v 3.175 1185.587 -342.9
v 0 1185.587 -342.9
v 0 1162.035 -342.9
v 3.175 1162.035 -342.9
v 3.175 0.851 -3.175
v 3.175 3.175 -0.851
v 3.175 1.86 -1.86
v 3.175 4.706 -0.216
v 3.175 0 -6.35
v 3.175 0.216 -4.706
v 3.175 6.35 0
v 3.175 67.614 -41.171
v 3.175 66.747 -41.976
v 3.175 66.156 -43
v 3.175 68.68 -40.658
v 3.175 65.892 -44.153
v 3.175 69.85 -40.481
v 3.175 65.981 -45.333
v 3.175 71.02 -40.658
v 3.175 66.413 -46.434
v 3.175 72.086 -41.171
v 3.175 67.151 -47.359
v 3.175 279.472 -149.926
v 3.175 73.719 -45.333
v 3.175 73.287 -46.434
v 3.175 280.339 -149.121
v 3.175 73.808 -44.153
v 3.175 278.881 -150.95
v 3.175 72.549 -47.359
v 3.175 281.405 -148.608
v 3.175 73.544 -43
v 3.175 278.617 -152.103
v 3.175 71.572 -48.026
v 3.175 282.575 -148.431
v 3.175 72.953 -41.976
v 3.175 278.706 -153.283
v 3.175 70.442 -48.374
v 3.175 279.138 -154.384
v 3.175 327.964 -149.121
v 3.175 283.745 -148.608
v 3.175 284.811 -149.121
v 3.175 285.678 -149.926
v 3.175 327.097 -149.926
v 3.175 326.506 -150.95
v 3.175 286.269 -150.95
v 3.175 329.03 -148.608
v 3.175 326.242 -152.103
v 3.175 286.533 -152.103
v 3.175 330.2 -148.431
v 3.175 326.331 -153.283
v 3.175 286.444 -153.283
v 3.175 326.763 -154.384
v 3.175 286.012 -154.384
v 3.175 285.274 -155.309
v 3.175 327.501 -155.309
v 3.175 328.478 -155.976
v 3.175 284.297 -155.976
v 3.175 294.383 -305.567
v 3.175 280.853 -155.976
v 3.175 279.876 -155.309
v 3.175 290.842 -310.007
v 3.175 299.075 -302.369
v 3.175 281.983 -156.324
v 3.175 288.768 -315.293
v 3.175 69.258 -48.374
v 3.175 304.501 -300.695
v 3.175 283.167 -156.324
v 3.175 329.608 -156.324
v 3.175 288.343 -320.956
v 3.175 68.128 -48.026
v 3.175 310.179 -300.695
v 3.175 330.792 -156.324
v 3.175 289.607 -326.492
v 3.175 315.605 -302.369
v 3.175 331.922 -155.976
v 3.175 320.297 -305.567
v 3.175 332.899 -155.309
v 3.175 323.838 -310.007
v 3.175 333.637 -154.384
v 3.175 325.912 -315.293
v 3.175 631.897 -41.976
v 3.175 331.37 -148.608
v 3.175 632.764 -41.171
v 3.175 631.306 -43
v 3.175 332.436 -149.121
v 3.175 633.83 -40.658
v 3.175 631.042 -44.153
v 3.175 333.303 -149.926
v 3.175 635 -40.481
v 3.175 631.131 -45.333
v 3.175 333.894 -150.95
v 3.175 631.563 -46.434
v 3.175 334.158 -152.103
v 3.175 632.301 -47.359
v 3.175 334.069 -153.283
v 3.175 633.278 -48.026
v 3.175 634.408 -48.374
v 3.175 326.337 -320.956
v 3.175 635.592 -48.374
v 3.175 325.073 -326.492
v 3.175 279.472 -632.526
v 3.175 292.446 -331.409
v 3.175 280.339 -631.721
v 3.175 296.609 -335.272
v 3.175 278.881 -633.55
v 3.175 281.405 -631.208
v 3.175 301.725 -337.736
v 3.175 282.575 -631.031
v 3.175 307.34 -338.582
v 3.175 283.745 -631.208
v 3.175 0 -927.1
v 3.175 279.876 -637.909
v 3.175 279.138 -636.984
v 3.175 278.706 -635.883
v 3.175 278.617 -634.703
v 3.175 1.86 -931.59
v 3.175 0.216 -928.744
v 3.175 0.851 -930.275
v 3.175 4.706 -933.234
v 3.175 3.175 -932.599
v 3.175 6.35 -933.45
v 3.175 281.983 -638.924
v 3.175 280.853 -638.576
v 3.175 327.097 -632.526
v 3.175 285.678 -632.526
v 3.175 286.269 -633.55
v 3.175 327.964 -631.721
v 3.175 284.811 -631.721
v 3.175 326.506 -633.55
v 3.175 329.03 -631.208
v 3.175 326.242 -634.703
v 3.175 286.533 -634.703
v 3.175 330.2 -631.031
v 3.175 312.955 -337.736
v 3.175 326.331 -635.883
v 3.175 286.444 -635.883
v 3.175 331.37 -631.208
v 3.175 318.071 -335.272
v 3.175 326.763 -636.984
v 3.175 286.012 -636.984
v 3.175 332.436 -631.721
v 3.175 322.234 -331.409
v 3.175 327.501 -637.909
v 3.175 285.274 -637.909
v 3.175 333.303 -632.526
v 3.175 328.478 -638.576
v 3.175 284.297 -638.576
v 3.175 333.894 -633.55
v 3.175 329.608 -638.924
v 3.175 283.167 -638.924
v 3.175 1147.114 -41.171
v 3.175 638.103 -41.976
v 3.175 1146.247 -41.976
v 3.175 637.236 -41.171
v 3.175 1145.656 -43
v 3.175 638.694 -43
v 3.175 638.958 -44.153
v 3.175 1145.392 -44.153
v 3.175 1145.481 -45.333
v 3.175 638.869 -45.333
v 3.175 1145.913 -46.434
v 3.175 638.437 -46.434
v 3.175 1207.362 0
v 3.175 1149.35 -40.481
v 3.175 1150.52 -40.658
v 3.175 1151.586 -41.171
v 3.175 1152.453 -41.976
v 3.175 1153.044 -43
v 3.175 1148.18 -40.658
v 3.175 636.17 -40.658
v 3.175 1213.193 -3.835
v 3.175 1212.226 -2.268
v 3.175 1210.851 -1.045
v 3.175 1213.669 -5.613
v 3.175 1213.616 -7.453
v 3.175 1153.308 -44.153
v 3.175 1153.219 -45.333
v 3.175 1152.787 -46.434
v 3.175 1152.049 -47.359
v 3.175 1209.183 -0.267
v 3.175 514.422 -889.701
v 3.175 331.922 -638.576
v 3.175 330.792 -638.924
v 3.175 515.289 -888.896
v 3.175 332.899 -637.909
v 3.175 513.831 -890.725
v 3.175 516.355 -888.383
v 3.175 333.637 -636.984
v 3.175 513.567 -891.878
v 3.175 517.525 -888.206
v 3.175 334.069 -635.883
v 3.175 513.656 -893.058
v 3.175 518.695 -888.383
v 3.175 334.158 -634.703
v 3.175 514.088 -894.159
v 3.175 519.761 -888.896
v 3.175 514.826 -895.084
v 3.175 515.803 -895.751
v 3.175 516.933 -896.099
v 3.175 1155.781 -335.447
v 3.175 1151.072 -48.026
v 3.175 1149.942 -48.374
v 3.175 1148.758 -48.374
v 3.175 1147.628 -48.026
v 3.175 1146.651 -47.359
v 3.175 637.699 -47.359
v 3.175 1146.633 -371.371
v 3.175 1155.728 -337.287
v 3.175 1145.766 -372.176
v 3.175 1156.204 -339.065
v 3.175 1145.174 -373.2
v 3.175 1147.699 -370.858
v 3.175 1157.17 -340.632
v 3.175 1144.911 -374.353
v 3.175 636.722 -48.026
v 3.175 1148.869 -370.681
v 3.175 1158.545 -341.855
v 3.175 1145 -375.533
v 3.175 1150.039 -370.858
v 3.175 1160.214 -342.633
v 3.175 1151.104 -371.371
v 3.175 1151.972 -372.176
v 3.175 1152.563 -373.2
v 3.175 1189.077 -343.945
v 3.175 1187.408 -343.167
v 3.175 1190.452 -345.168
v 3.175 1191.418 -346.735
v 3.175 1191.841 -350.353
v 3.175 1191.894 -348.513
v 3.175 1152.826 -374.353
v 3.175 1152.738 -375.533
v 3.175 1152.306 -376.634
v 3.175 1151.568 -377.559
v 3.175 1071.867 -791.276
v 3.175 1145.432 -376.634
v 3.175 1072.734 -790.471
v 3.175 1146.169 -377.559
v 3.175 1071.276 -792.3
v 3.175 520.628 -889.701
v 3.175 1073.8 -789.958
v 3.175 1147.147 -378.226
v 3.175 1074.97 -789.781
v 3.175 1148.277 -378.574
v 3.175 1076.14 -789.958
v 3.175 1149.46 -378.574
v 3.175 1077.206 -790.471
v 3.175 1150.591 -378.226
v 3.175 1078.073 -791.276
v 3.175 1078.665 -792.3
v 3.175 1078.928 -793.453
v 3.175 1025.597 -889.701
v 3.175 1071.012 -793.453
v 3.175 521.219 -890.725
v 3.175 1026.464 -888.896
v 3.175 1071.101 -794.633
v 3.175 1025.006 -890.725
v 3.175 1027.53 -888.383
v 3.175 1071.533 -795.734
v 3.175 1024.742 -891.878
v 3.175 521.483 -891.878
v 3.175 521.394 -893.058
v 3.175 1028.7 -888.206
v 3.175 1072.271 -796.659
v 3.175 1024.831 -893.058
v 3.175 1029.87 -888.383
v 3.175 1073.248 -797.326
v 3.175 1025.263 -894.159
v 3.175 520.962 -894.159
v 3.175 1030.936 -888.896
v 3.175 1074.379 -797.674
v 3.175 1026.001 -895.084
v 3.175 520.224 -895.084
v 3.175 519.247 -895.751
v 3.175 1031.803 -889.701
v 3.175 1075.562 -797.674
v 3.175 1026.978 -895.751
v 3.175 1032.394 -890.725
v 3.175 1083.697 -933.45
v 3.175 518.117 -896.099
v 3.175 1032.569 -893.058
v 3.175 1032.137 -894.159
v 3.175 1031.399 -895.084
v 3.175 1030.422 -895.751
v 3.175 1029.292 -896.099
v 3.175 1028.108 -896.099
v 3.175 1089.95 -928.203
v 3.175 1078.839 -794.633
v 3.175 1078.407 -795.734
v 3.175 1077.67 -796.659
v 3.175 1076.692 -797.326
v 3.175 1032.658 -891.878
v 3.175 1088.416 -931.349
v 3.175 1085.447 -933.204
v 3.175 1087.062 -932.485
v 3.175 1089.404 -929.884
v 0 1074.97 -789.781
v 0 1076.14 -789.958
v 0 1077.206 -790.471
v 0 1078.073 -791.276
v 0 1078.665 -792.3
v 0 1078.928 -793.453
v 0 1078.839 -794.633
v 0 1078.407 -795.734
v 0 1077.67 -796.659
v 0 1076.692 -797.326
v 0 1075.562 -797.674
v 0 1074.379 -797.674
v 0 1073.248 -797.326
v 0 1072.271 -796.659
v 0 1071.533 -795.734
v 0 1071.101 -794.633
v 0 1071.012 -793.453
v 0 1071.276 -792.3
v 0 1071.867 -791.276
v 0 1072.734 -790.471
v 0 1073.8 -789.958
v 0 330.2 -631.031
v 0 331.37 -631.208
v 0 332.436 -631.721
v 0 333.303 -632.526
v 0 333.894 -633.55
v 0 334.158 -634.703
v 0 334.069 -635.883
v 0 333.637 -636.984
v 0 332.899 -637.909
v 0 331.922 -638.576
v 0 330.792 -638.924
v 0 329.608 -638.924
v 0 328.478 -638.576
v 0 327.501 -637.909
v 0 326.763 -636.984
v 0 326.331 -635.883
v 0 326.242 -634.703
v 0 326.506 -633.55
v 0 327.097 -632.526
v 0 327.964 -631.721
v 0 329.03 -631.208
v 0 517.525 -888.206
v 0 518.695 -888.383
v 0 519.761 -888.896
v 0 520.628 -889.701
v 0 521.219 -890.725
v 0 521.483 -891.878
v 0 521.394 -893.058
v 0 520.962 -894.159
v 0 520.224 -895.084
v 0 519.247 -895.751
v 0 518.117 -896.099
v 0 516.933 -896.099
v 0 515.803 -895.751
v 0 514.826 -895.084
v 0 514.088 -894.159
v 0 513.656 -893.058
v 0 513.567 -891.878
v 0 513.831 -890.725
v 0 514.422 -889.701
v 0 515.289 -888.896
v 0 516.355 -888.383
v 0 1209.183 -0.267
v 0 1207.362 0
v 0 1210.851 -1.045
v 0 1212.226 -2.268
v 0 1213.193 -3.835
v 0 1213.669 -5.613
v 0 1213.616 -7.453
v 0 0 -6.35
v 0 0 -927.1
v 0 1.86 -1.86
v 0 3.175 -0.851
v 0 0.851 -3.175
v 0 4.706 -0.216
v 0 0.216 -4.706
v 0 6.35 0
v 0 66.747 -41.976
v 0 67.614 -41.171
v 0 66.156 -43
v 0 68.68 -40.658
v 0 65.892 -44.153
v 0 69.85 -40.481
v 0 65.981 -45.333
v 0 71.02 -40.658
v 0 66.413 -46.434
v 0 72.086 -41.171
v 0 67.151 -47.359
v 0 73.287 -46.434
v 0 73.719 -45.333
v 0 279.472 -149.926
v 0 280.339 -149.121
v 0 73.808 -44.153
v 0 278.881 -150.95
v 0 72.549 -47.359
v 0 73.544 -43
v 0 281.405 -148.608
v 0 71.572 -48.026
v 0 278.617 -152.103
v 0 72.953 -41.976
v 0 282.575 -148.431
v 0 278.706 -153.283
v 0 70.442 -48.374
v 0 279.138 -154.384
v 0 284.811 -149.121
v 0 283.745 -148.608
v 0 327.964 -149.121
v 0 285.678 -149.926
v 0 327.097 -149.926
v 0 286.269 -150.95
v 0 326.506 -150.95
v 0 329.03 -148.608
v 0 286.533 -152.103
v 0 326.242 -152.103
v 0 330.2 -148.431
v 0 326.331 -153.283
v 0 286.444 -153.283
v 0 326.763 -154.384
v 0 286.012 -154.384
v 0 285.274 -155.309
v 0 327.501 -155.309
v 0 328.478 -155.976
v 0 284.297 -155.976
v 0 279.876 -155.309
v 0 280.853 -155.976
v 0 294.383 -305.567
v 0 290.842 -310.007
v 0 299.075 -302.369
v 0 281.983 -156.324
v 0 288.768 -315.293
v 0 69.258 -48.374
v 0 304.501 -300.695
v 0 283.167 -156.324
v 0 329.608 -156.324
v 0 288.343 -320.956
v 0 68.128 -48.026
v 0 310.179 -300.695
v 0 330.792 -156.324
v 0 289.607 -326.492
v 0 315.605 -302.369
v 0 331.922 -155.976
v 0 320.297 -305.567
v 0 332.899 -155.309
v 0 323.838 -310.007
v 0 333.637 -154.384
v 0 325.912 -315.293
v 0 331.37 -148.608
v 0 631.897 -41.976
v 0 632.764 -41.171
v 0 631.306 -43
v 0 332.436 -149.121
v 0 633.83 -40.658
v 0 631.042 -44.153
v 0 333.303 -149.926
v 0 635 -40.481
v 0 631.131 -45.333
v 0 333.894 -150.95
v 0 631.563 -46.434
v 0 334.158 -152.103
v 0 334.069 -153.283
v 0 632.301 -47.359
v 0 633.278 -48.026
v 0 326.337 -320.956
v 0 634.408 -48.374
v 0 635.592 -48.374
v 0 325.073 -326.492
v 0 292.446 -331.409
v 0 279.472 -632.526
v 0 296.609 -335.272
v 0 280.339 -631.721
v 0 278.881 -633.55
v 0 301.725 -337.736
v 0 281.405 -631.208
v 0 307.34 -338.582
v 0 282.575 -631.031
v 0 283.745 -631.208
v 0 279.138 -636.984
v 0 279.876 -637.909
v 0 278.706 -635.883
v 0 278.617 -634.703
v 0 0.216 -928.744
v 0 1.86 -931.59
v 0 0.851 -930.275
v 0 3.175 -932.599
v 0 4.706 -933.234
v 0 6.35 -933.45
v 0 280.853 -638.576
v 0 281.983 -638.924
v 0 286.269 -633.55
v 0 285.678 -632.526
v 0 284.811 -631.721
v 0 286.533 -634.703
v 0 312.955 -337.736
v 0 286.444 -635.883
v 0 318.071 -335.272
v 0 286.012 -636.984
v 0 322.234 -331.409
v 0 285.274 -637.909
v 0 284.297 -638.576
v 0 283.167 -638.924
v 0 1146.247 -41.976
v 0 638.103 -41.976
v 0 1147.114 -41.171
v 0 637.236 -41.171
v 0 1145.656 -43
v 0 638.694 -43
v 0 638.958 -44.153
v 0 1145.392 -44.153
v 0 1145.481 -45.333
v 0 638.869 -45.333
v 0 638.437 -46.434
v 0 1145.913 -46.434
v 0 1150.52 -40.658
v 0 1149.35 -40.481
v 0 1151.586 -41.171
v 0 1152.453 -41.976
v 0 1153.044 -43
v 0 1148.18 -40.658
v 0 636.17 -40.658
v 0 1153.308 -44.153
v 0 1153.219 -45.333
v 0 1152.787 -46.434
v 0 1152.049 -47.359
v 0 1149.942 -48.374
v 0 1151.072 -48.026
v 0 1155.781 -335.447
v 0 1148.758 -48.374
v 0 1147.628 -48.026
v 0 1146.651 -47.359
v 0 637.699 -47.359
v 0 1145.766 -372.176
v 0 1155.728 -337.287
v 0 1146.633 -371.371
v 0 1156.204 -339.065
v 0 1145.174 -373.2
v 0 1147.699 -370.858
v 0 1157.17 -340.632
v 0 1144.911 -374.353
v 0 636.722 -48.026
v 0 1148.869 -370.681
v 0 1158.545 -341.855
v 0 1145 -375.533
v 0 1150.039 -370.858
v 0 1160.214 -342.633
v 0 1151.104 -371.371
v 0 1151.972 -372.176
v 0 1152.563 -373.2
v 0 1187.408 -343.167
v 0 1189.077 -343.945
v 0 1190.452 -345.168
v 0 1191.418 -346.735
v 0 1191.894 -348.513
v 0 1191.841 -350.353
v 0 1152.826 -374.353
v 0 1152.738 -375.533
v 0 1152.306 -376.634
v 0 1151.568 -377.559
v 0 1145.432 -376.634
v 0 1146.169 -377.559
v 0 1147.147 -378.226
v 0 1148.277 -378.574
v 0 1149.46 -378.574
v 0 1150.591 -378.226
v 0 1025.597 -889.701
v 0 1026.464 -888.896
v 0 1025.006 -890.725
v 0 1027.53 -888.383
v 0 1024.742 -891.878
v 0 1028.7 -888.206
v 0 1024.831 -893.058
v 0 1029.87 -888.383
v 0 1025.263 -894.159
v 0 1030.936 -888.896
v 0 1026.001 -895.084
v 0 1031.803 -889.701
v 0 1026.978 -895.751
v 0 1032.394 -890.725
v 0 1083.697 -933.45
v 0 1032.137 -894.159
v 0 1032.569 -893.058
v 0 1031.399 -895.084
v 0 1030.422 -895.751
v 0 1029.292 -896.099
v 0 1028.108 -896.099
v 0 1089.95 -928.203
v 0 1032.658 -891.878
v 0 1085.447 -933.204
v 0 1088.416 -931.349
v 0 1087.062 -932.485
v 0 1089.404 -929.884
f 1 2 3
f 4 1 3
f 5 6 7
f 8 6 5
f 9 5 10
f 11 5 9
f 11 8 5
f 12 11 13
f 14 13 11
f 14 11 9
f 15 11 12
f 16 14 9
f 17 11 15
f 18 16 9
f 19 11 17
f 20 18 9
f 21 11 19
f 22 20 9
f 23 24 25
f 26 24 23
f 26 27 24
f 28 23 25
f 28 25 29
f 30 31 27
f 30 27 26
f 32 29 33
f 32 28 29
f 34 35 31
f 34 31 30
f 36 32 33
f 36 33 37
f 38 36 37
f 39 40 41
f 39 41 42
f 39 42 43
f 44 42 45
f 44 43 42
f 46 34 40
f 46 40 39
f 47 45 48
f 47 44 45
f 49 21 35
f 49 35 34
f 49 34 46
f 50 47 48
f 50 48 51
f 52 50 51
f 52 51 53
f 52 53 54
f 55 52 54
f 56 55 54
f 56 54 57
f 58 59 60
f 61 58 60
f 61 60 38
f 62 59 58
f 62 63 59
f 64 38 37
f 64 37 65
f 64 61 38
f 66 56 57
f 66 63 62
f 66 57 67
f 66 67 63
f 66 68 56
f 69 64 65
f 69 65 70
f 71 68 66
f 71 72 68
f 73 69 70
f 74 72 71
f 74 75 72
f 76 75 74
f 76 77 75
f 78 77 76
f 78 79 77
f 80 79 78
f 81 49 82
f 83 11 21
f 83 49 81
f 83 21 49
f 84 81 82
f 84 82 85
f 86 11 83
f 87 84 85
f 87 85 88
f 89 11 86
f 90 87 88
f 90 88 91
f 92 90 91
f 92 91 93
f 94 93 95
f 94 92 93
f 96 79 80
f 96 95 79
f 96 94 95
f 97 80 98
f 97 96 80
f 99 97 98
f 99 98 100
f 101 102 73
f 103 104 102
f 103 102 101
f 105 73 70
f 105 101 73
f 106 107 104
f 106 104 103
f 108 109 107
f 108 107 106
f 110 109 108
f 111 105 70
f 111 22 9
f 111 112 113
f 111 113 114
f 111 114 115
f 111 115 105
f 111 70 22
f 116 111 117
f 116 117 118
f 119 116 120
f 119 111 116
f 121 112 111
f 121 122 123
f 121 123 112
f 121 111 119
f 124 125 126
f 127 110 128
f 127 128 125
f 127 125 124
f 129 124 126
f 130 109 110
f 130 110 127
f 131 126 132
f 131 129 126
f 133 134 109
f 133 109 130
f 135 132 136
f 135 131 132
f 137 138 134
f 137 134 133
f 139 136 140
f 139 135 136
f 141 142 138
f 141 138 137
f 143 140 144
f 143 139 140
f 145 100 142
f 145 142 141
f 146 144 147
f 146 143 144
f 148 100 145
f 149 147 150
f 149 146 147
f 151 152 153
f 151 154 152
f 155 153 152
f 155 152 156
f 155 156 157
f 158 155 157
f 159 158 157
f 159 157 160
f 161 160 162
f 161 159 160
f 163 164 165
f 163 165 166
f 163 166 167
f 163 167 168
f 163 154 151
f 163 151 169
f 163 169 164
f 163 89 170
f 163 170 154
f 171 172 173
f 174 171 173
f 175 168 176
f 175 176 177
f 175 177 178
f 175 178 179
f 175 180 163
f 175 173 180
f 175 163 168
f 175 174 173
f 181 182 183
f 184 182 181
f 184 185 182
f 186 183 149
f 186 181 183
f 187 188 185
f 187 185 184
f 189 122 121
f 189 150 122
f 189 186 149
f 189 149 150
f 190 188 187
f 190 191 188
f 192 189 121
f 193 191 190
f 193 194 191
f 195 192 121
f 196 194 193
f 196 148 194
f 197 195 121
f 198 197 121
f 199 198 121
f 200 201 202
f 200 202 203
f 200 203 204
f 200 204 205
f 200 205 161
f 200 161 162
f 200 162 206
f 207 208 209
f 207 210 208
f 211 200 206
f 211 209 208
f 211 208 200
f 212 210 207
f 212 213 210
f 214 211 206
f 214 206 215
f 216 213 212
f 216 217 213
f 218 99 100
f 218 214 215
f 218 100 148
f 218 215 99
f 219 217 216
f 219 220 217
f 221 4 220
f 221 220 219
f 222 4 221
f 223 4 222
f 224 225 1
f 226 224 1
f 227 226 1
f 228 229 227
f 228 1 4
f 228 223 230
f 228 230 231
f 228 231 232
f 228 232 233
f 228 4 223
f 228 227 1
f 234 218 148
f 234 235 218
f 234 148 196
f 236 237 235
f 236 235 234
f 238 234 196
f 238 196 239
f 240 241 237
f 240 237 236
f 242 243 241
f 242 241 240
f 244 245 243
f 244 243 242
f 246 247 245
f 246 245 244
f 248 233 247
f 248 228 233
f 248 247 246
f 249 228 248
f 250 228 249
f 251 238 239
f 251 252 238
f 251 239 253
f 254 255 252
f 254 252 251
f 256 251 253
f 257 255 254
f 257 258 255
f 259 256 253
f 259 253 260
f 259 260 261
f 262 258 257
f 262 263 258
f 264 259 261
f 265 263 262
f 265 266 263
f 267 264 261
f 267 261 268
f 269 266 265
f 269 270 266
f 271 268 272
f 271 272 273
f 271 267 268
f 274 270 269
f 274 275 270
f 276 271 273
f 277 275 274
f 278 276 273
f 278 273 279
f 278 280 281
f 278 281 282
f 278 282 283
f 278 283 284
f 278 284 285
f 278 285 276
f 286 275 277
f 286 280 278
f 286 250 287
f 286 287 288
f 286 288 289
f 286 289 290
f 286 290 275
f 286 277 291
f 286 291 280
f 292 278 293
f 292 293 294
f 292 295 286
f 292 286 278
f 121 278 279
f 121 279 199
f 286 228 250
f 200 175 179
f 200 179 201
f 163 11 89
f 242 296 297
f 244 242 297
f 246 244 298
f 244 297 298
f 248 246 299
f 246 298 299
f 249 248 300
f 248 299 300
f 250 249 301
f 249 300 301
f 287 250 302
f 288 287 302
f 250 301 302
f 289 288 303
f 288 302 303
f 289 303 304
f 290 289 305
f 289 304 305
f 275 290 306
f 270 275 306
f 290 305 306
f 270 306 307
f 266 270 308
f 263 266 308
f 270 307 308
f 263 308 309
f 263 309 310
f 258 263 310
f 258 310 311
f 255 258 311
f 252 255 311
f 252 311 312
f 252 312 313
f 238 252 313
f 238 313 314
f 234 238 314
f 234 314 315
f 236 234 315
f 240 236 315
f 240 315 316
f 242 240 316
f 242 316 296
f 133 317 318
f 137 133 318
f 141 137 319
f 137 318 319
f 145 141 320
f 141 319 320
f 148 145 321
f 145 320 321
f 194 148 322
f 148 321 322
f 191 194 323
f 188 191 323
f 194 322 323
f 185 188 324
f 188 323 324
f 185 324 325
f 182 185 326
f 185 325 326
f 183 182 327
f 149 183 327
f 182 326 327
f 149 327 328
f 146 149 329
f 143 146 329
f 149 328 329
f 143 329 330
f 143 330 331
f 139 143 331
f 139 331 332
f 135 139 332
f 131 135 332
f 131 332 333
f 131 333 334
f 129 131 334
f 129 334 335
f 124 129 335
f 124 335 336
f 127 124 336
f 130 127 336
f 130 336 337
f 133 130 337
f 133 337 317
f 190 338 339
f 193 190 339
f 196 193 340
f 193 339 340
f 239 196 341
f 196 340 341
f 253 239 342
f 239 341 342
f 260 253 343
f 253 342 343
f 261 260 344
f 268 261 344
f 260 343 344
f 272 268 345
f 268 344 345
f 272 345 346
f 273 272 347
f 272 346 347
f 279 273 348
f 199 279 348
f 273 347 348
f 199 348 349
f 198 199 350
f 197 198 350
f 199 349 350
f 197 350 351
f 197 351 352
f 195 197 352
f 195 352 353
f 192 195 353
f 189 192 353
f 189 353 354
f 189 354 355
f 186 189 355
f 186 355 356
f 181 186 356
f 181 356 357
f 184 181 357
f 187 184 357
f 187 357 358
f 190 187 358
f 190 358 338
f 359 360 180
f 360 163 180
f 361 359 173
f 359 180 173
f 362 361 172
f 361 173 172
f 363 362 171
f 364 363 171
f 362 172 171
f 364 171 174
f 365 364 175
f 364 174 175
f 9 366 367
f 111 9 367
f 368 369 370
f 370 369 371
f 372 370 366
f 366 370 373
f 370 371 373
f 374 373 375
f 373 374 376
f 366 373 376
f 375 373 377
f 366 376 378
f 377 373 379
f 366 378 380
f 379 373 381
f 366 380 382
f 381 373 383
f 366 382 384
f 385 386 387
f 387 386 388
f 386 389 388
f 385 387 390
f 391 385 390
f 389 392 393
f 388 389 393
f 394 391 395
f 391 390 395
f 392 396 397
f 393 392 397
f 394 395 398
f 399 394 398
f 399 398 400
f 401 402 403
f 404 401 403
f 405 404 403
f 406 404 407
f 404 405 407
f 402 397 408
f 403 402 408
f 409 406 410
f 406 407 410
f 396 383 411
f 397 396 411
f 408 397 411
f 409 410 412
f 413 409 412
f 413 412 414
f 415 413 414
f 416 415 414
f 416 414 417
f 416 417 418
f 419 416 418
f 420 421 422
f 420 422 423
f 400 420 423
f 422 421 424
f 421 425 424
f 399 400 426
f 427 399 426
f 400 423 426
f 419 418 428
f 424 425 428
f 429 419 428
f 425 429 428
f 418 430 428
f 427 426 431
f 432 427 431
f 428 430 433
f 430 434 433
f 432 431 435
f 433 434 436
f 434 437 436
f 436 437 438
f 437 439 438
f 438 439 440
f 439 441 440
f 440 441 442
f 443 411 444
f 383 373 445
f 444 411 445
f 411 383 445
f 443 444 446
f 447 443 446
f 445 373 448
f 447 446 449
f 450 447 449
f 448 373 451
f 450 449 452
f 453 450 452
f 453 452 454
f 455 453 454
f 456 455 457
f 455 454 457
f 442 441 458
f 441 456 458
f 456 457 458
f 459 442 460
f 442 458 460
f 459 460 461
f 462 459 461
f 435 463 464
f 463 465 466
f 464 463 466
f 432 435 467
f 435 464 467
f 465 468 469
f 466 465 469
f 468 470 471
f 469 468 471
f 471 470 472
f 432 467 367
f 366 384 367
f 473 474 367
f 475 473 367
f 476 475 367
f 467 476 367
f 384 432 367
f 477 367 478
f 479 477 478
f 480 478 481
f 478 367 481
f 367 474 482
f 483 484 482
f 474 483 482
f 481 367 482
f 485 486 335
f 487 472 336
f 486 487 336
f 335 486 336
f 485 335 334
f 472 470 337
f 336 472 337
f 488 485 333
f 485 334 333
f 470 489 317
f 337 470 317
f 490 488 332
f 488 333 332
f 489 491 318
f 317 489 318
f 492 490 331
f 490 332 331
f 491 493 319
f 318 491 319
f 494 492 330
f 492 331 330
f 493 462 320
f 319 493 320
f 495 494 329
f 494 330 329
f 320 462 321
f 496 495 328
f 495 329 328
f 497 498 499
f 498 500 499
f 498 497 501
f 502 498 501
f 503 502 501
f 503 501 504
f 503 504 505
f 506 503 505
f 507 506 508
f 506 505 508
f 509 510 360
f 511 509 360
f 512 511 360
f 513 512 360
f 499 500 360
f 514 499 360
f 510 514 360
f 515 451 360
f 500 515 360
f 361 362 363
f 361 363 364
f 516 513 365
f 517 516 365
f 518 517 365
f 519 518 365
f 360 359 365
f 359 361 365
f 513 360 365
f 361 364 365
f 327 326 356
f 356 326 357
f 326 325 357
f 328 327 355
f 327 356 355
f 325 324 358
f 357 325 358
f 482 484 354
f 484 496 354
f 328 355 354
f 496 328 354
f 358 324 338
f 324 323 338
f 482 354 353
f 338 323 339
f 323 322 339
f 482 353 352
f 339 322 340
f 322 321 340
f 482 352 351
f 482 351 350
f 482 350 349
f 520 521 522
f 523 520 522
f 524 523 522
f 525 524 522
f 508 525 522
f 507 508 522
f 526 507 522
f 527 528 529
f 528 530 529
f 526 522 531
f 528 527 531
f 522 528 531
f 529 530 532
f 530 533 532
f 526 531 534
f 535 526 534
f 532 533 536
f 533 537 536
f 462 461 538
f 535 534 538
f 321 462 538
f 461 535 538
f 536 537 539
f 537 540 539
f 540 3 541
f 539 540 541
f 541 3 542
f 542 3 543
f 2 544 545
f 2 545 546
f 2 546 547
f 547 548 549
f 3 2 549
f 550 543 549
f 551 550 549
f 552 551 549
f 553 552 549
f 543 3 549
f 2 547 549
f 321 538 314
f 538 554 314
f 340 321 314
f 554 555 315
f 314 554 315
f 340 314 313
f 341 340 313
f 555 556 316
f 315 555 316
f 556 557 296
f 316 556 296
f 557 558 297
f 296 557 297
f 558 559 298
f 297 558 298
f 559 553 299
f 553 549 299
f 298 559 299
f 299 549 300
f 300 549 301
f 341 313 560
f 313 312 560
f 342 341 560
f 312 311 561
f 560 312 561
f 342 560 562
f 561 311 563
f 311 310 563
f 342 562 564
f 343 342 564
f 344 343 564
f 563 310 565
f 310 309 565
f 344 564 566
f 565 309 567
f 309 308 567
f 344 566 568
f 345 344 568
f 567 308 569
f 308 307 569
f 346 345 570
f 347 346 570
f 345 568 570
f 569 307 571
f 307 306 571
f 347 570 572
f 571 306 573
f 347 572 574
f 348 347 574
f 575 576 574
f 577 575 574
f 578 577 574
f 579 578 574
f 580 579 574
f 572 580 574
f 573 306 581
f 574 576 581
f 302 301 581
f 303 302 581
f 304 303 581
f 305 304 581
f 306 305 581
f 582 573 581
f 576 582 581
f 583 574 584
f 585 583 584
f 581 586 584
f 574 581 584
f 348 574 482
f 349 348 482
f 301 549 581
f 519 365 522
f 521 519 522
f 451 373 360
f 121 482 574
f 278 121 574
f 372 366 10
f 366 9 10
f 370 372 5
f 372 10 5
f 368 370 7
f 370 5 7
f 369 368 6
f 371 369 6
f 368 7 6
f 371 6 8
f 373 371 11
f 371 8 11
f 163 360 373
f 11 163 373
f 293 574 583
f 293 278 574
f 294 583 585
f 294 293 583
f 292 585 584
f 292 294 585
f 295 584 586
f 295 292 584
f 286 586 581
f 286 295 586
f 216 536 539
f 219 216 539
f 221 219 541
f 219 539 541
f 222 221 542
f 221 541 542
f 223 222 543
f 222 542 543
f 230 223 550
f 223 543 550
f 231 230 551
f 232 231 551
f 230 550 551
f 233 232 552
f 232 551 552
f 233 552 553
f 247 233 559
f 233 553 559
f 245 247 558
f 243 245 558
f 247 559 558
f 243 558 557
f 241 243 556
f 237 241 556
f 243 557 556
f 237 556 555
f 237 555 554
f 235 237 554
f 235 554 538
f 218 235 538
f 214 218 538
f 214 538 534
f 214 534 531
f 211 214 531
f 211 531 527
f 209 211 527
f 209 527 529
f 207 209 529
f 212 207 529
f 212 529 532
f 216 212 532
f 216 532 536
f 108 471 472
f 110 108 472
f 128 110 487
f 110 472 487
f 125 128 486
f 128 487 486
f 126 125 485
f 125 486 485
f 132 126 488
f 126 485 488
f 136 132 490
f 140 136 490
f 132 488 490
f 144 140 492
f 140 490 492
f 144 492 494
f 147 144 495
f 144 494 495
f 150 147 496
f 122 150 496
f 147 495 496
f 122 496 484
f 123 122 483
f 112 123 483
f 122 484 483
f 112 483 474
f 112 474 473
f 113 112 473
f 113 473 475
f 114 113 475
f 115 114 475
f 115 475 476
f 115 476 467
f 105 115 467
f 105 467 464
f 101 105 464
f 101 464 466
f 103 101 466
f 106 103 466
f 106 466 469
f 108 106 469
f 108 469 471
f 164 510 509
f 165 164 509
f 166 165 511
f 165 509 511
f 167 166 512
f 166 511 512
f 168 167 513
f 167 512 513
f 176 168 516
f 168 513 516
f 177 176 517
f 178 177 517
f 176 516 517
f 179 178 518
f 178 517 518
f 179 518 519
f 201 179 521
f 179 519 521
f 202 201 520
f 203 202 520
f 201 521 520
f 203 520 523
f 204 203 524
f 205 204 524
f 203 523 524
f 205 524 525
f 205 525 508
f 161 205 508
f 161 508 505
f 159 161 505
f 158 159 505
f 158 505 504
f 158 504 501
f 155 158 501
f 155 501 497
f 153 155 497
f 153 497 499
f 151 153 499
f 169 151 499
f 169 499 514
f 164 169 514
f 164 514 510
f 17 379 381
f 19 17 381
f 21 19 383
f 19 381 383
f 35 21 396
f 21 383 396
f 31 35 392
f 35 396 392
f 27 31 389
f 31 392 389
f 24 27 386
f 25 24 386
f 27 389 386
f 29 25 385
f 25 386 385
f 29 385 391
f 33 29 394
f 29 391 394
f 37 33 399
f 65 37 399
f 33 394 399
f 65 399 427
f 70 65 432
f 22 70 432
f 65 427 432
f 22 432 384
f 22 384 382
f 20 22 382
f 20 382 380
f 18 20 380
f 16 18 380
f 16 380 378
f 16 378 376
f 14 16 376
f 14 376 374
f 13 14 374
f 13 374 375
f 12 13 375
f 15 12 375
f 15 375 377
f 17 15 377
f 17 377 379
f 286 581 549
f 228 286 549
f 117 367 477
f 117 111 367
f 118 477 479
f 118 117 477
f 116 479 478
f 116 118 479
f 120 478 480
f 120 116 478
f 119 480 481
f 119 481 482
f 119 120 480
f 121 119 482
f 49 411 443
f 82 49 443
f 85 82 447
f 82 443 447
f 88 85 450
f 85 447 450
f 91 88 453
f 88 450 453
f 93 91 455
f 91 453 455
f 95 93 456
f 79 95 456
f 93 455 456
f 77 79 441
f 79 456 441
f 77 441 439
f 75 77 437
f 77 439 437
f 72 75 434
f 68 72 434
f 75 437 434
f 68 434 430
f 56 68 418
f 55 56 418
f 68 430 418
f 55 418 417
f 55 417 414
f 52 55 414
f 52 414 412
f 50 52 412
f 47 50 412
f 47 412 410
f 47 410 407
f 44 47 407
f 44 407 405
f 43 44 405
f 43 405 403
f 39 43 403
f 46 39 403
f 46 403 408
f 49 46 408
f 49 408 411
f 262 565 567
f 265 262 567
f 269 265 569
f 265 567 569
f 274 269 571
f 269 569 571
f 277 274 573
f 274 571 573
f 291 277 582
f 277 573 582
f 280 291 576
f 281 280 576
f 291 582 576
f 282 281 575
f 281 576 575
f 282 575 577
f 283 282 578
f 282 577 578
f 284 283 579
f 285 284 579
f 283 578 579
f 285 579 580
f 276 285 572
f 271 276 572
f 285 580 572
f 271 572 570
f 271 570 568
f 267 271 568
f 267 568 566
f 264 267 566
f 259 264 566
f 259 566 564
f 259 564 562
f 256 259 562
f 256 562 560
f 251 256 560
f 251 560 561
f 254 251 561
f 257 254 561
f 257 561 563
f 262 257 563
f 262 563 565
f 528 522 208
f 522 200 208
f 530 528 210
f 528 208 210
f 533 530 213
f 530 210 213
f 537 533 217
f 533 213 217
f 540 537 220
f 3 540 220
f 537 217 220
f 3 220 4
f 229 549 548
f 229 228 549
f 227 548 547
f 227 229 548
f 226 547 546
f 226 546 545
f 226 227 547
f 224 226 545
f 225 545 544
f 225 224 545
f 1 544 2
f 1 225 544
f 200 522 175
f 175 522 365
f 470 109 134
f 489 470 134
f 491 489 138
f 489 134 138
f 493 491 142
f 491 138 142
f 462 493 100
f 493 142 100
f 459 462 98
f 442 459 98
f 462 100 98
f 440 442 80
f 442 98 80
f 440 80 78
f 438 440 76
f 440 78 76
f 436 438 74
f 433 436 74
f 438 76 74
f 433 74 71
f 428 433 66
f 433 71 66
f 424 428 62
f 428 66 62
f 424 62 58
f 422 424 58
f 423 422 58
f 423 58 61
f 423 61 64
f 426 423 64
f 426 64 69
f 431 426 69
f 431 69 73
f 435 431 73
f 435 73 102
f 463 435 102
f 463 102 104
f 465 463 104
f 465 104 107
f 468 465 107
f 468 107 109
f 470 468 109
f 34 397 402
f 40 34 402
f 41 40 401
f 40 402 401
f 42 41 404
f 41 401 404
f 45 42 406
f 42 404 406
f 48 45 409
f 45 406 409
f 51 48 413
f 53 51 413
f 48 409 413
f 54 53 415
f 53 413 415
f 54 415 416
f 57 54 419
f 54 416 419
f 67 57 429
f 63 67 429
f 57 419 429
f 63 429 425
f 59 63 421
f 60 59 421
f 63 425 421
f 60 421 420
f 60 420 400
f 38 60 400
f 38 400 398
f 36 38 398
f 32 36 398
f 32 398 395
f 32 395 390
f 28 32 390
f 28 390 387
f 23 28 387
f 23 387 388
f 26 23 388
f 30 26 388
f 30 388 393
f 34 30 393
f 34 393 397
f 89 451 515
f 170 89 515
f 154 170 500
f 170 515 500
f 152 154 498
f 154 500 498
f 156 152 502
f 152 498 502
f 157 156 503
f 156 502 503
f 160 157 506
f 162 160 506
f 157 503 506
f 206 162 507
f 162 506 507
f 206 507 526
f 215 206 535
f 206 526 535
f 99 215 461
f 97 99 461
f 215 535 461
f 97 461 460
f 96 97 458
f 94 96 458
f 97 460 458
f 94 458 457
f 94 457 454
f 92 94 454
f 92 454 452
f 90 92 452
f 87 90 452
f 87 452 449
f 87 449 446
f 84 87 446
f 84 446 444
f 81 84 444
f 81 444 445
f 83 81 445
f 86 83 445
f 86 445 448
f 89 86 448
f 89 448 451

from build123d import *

# Parameters (mm, degrees)
BOSS_EXTRUDE1_DEPTH            = 3.175
SKETCH2_R                      = 19.05
CUT_EXTRUDE1_DEPTH             = 4.175
FILLET1_R                      = 6.35
F_5_16_0_3125_DIAMETER_HOLE1_D = 7.9375


with BuildPart() as part:
    # Sketch1 → Boss-Extrude1 (new body)
    with BuildSketch(Plane(origin=(0, 0, 0), x_dir=(0, 0, -1), z_dir=(1, 0, 0))):
        Polygon((0, 0), (933.45, 0), (933.45, 1089.025), (342.9, 1193.154898457), (342.9, 1154.467144545), (0, 1214.929666229), align=None)
    extrude(amount=BOSS_EXTRUDE1_DEPTH)

    # Sketch2 → Cut-Extrude1 (cut, through all)
    with BuildSketch(Plane(origin=(3.175, 0, 0), x_dir=(0, 0, -1), z_dir=(1, 0, 0))):
        with Locations((319.532, 307.34)):
            Circle(SKETCH2_R)
    extrude(amount=-CUT_EXTRUDE1_DEPTH, mode=Mode.SUBTRACT)

    # Fillet1
    fillet1_edges = [part.edges().sort_by_distance(p)[0] for p in [
        (1.5875, 1214.929666229, 0),
        (1.5875, 1154.467144545, -342.9),
        (1.5875, 1193.154898457, -342.9),
        (1.5875, 1089.025, -933.45),
        (1.5875, 0, -933.45),
        (1.5875, 0, 0),
    ]]
    fillet(fillet1_edges, radius=FILLET1_R)

    # 5/16 (0.3125) Diameter Hole1 (through all)
    with Locations(Plane(origin=(3.175, 0, 0), x_dir=(0, 0, -1), z_dir=(1, 0, 0))):
        with Locations((44.45, 1149.35), (44.45, 635), (152.4, 330.2), (152.4, 282.575), (635, 330.2), (635, 282.575), (892.175, 517.525), (892.175, 1028.7), (374.65, 1148.868762907), (793.75, 1074.970125292), (44.45, 69.85)):
            Hole(F_5_16_0_3125_DIAMETER_HOLE1_D / 2)


solid = part.part
